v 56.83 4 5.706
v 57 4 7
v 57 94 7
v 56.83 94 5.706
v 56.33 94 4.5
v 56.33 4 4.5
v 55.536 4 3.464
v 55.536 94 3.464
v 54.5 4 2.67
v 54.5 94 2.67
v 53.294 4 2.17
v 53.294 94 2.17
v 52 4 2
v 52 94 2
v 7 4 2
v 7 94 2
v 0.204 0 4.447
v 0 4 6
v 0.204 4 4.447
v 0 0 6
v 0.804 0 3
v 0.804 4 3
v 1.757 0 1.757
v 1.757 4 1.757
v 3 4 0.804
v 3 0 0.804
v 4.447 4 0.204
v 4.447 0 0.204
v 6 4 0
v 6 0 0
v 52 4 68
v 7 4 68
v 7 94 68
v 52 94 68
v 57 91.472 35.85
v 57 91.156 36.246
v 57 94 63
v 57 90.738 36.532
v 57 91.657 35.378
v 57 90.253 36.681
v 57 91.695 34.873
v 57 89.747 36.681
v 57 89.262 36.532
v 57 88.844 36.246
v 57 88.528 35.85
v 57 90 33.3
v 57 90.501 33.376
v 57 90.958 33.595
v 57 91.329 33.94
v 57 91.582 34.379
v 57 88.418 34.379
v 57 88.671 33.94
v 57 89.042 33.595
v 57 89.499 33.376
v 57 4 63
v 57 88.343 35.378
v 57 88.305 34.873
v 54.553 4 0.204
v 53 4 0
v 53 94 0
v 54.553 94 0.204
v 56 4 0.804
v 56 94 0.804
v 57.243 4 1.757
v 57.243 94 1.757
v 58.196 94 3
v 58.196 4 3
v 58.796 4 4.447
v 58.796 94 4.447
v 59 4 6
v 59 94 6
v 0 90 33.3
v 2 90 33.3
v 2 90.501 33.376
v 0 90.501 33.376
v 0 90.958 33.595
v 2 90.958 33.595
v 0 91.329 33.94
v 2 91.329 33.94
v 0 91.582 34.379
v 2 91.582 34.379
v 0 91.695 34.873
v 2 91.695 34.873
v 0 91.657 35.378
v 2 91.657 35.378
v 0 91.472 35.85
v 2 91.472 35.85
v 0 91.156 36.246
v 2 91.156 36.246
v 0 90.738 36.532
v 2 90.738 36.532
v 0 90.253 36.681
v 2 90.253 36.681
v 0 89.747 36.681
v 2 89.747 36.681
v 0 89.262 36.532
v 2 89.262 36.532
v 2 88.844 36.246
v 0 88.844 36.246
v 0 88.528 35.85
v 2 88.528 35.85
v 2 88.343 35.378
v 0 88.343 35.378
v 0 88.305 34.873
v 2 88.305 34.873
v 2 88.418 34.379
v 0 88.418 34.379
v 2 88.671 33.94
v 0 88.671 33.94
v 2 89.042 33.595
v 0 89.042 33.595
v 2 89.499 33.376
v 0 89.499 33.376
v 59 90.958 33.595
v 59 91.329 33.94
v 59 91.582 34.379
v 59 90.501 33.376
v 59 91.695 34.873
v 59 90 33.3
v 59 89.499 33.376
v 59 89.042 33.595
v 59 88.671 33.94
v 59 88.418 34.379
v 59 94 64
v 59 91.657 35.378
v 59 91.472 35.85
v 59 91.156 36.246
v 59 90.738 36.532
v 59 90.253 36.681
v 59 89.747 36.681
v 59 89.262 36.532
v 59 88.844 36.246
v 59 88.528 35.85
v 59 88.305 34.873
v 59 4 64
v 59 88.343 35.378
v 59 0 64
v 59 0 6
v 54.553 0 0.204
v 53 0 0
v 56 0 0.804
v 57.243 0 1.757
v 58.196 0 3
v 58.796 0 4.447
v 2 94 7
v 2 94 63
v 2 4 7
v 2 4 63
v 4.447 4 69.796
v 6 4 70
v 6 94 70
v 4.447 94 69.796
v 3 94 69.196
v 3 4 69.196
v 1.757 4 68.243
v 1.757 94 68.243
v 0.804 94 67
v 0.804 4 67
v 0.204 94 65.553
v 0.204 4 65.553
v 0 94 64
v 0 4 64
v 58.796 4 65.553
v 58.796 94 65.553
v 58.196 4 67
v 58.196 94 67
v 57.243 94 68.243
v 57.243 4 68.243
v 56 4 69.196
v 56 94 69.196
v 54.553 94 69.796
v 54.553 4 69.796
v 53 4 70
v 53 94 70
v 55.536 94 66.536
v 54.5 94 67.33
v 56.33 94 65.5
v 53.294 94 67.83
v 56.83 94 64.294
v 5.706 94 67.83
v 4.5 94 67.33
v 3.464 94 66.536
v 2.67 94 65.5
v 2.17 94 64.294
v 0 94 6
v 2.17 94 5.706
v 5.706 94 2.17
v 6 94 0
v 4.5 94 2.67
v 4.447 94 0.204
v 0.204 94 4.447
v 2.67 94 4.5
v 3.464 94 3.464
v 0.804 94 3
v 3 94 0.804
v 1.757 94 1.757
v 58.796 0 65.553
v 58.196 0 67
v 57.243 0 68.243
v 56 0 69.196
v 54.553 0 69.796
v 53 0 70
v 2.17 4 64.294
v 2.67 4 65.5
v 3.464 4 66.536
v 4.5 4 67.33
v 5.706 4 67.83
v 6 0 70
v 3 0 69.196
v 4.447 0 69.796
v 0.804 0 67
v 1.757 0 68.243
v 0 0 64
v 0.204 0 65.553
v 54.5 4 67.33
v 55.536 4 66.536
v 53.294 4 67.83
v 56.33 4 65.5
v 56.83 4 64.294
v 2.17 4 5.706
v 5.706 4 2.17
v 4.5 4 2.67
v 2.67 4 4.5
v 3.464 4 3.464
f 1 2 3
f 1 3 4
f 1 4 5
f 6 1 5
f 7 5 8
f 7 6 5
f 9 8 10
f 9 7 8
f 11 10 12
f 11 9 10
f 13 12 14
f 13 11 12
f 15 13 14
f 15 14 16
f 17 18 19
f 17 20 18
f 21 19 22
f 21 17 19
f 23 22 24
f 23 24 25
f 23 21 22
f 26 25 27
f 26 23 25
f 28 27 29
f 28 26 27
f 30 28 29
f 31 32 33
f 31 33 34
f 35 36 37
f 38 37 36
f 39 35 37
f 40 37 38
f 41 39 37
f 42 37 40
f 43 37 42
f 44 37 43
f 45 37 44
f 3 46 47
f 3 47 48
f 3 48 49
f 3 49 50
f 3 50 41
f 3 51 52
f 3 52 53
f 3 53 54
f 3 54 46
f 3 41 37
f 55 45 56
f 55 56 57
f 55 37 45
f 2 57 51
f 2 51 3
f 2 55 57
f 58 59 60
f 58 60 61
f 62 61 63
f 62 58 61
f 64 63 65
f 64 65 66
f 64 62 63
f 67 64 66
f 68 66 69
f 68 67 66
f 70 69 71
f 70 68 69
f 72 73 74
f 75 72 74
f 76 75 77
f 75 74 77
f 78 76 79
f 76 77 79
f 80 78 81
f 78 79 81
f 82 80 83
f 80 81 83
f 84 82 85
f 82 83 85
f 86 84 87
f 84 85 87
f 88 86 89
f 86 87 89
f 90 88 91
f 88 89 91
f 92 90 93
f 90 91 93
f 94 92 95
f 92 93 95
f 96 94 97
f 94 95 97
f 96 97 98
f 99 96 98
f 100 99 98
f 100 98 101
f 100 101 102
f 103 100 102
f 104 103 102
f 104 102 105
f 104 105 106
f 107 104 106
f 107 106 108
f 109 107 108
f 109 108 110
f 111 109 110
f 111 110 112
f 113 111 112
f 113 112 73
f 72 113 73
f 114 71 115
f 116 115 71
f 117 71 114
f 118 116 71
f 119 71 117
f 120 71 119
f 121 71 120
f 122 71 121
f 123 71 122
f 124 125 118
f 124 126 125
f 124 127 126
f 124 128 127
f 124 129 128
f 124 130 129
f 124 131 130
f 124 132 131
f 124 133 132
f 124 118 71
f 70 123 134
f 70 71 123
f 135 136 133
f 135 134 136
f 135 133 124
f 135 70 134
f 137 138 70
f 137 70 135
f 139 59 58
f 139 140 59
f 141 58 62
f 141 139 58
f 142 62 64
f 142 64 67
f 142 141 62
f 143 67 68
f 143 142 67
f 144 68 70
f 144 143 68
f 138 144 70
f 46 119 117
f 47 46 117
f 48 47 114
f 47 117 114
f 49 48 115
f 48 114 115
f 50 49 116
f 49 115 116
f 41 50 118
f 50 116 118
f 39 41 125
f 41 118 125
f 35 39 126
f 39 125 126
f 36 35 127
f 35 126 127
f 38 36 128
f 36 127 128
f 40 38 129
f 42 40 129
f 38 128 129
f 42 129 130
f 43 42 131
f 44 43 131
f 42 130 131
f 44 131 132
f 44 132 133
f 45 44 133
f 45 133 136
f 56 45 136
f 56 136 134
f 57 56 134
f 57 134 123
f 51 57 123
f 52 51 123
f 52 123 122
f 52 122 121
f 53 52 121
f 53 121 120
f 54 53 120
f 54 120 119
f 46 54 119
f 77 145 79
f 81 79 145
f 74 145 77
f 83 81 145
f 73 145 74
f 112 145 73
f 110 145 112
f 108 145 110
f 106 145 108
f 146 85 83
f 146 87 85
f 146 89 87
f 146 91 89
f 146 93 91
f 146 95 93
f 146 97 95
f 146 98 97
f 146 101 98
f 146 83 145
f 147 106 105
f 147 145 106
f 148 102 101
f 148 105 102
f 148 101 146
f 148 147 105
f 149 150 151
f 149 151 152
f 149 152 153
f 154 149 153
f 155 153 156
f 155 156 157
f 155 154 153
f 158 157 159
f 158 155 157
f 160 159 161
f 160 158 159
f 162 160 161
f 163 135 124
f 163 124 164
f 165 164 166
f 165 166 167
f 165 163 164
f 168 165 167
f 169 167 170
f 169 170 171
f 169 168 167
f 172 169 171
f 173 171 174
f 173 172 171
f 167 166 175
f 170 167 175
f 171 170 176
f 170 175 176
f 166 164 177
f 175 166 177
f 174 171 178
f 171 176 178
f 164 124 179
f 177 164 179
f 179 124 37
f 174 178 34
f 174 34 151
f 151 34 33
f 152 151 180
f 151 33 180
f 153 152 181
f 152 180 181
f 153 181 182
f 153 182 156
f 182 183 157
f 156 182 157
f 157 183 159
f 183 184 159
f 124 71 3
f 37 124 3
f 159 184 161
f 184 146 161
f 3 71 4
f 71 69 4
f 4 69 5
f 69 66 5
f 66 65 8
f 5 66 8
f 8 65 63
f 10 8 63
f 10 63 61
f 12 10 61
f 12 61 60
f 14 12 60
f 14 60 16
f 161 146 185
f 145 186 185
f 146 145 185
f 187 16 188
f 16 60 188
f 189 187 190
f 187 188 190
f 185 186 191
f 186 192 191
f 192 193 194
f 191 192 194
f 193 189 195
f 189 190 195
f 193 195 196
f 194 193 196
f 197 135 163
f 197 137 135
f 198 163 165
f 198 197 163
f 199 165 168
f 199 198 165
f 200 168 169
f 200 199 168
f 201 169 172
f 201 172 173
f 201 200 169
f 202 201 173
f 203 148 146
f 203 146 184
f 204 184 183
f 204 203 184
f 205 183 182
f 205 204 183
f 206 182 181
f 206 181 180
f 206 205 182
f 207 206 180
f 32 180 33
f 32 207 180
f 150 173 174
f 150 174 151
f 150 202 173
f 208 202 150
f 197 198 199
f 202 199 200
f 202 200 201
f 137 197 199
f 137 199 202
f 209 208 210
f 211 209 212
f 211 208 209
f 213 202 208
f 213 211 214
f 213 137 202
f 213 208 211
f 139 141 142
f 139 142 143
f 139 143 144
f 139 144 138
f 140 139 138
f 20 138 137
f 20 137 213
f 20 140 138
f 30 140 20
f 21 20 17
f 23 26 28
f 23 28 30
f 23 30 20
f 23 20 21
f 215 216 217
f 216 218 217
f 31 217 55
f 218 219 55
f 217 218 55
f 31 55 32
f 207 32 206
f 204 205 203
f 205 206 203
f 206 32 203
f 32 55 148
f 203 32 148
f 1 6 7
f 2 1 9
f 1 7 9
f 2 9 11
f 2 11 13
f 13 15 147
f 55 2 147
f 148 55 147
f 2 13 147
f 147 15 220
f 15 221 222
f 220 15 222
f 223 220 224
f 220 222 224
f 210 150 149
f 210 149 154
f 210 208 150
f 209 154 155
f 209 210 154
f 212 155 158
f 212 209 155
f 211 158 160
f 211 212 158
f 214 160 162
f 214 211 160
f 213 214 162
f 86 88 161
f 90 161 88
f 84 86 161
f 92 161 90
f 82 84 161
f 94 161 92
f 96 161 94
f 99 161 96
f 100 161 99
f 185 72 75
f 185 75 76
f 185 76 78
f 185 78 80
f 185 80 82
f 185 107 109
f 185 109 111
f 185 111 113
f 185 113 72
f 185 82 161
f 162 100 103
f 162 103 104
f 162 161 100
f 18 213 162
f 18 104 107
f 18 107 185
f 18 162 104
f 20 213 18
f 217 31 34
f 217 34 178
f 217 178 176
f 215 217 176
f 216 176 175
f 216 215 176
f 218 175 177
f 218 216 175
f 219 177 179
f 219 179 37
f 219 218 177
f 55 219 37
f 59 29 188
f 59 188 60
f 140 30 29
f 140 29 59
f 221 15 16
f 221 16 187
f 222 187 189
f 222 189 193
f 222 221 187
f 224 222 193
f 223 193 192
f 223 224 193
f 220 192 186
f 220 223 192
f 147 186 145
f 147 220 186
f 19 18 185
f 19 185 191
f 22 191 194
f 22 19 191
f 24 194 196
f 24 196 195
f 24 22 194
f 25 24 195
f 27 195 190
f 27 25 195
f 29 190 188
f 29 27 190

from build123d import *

# Parameters (mm, degrees)
BOSS_EXTRUDE1_DEPTH = 4
BOSS_EXTRUDE2_DEPTH = 90
SKETCH4_R           = 1.7
CUT_EXTRUDE1_DEPTH  = 93


# Read off the part's stored shape, not the designer's step: Surface-Imported1
with BuildPart() as part:
    # Sketch2 → Boss-Extrude1 (new body)
    with BuildSketch(Plane(origin=(0, 0, 0), x_dir=(1, 0, 0), z_dir=(0, 1, 0))):
        with BuildLine():
            Line((6.000000983, 0), (52.999999374, 0))
            ThreePointArc((52.999999374, 0), (57.242640757, -1.757359601), (59.000000358, -6.000000983))
            Line((59.000000358, -6.000000983), (59.000000358, -63.999995589))
            ThreePointArc((59.000000358, -63.999995589), (57.242641528, -68.242638834), (52.999999374, -70.000000298))
            Line((52.999999374, -70.000000298), (6.000000983, -70.000000298))
            ThreePointArc((6.000000983, -70.000000298), (1.75735699, -68.242640674), (0, -63.999995589))
            Line((0, -63.999995589), (0, -6.000000983))
            ThreePointArc((0, -6.000000983), (1.757359601, -1.757359601), (6.000000983, 0))
        make_face()
    extrude(amount=BOSS_EXTRUDE1_DEPTH)

    # Sketch3 → Boss-Extrude2 (add)
    with BuildSketch(Plane(origin=(0, 4, 0), x_dir=(1, 0, 0), z_dir=(0, 1, 0))):
        with BuildLine():
            Line((59.000000358, -6), (59.000000358, -64.000000298))
            ThreePointArc((59.000000358, -64.000000298), (57.242641045, -68.242640985), (53.000000358, -70.000000298))
            Line((53.000000358, -70.000000298), (6, -70.000000298))
            ThreePointArc((6, -70.000000298), (1.757359313, -68.242640985), (0, -64.000000298))
            Line((0, -64.000000298), (0, -6))
            ThreePointArc((0, -6), (1.757359313, -1.757359313), (6, 0))
            Line((6, 0), (53.000000358, 0))
            ThreePointArc((53.000000358, 0), (57.242641045, -1.757359313), (59.000000358, -6))
        make_face()
        with BuildLine():
            Line((2, -7), (2, -63.000000298))
            ThreePointArc((2, -63.000000298), (3.464466094, -66.535534204), (7, -68.000000298))
            Line((7, -68.000000298), (52.000000358, -68.000000298))
            ThreePointArc((52.000000358, -68.000000298), (55.535534264, -66.535534204), (57.000000358, -63.000000298))
            Line((57.000000358, -63.000000298), (57.000000358, -7))
            ThreePointArc((57.000000358, -7), (55.535534264, -3.464466094), (52.000000358, -2))
            Line((52.000000358, -2), (7, -2))
            ThreePointArc((7, -2), (3.464466094, -3.464466094), (2, -7))
        make_face(mode=Mode.SUBTRACT)
    extrude(amount=BOSS_EXTRUDE2_DEPTH)

    # Sketch4 → Cut-Extrude1 (cut)
    with BuildSketch(Plane(origin=(59.000000358, 0, 0), x_dir=(0, 0, -1), z_dir=(1, 0, 0))):
        with Locations((-35.000000098, 90)):
            Circle(SKETCH4_R)
    extrude(amount=-CUT_EXTRUDE1_DEPTH, mode=Mode.SUBTRACT)


solid = part.part
